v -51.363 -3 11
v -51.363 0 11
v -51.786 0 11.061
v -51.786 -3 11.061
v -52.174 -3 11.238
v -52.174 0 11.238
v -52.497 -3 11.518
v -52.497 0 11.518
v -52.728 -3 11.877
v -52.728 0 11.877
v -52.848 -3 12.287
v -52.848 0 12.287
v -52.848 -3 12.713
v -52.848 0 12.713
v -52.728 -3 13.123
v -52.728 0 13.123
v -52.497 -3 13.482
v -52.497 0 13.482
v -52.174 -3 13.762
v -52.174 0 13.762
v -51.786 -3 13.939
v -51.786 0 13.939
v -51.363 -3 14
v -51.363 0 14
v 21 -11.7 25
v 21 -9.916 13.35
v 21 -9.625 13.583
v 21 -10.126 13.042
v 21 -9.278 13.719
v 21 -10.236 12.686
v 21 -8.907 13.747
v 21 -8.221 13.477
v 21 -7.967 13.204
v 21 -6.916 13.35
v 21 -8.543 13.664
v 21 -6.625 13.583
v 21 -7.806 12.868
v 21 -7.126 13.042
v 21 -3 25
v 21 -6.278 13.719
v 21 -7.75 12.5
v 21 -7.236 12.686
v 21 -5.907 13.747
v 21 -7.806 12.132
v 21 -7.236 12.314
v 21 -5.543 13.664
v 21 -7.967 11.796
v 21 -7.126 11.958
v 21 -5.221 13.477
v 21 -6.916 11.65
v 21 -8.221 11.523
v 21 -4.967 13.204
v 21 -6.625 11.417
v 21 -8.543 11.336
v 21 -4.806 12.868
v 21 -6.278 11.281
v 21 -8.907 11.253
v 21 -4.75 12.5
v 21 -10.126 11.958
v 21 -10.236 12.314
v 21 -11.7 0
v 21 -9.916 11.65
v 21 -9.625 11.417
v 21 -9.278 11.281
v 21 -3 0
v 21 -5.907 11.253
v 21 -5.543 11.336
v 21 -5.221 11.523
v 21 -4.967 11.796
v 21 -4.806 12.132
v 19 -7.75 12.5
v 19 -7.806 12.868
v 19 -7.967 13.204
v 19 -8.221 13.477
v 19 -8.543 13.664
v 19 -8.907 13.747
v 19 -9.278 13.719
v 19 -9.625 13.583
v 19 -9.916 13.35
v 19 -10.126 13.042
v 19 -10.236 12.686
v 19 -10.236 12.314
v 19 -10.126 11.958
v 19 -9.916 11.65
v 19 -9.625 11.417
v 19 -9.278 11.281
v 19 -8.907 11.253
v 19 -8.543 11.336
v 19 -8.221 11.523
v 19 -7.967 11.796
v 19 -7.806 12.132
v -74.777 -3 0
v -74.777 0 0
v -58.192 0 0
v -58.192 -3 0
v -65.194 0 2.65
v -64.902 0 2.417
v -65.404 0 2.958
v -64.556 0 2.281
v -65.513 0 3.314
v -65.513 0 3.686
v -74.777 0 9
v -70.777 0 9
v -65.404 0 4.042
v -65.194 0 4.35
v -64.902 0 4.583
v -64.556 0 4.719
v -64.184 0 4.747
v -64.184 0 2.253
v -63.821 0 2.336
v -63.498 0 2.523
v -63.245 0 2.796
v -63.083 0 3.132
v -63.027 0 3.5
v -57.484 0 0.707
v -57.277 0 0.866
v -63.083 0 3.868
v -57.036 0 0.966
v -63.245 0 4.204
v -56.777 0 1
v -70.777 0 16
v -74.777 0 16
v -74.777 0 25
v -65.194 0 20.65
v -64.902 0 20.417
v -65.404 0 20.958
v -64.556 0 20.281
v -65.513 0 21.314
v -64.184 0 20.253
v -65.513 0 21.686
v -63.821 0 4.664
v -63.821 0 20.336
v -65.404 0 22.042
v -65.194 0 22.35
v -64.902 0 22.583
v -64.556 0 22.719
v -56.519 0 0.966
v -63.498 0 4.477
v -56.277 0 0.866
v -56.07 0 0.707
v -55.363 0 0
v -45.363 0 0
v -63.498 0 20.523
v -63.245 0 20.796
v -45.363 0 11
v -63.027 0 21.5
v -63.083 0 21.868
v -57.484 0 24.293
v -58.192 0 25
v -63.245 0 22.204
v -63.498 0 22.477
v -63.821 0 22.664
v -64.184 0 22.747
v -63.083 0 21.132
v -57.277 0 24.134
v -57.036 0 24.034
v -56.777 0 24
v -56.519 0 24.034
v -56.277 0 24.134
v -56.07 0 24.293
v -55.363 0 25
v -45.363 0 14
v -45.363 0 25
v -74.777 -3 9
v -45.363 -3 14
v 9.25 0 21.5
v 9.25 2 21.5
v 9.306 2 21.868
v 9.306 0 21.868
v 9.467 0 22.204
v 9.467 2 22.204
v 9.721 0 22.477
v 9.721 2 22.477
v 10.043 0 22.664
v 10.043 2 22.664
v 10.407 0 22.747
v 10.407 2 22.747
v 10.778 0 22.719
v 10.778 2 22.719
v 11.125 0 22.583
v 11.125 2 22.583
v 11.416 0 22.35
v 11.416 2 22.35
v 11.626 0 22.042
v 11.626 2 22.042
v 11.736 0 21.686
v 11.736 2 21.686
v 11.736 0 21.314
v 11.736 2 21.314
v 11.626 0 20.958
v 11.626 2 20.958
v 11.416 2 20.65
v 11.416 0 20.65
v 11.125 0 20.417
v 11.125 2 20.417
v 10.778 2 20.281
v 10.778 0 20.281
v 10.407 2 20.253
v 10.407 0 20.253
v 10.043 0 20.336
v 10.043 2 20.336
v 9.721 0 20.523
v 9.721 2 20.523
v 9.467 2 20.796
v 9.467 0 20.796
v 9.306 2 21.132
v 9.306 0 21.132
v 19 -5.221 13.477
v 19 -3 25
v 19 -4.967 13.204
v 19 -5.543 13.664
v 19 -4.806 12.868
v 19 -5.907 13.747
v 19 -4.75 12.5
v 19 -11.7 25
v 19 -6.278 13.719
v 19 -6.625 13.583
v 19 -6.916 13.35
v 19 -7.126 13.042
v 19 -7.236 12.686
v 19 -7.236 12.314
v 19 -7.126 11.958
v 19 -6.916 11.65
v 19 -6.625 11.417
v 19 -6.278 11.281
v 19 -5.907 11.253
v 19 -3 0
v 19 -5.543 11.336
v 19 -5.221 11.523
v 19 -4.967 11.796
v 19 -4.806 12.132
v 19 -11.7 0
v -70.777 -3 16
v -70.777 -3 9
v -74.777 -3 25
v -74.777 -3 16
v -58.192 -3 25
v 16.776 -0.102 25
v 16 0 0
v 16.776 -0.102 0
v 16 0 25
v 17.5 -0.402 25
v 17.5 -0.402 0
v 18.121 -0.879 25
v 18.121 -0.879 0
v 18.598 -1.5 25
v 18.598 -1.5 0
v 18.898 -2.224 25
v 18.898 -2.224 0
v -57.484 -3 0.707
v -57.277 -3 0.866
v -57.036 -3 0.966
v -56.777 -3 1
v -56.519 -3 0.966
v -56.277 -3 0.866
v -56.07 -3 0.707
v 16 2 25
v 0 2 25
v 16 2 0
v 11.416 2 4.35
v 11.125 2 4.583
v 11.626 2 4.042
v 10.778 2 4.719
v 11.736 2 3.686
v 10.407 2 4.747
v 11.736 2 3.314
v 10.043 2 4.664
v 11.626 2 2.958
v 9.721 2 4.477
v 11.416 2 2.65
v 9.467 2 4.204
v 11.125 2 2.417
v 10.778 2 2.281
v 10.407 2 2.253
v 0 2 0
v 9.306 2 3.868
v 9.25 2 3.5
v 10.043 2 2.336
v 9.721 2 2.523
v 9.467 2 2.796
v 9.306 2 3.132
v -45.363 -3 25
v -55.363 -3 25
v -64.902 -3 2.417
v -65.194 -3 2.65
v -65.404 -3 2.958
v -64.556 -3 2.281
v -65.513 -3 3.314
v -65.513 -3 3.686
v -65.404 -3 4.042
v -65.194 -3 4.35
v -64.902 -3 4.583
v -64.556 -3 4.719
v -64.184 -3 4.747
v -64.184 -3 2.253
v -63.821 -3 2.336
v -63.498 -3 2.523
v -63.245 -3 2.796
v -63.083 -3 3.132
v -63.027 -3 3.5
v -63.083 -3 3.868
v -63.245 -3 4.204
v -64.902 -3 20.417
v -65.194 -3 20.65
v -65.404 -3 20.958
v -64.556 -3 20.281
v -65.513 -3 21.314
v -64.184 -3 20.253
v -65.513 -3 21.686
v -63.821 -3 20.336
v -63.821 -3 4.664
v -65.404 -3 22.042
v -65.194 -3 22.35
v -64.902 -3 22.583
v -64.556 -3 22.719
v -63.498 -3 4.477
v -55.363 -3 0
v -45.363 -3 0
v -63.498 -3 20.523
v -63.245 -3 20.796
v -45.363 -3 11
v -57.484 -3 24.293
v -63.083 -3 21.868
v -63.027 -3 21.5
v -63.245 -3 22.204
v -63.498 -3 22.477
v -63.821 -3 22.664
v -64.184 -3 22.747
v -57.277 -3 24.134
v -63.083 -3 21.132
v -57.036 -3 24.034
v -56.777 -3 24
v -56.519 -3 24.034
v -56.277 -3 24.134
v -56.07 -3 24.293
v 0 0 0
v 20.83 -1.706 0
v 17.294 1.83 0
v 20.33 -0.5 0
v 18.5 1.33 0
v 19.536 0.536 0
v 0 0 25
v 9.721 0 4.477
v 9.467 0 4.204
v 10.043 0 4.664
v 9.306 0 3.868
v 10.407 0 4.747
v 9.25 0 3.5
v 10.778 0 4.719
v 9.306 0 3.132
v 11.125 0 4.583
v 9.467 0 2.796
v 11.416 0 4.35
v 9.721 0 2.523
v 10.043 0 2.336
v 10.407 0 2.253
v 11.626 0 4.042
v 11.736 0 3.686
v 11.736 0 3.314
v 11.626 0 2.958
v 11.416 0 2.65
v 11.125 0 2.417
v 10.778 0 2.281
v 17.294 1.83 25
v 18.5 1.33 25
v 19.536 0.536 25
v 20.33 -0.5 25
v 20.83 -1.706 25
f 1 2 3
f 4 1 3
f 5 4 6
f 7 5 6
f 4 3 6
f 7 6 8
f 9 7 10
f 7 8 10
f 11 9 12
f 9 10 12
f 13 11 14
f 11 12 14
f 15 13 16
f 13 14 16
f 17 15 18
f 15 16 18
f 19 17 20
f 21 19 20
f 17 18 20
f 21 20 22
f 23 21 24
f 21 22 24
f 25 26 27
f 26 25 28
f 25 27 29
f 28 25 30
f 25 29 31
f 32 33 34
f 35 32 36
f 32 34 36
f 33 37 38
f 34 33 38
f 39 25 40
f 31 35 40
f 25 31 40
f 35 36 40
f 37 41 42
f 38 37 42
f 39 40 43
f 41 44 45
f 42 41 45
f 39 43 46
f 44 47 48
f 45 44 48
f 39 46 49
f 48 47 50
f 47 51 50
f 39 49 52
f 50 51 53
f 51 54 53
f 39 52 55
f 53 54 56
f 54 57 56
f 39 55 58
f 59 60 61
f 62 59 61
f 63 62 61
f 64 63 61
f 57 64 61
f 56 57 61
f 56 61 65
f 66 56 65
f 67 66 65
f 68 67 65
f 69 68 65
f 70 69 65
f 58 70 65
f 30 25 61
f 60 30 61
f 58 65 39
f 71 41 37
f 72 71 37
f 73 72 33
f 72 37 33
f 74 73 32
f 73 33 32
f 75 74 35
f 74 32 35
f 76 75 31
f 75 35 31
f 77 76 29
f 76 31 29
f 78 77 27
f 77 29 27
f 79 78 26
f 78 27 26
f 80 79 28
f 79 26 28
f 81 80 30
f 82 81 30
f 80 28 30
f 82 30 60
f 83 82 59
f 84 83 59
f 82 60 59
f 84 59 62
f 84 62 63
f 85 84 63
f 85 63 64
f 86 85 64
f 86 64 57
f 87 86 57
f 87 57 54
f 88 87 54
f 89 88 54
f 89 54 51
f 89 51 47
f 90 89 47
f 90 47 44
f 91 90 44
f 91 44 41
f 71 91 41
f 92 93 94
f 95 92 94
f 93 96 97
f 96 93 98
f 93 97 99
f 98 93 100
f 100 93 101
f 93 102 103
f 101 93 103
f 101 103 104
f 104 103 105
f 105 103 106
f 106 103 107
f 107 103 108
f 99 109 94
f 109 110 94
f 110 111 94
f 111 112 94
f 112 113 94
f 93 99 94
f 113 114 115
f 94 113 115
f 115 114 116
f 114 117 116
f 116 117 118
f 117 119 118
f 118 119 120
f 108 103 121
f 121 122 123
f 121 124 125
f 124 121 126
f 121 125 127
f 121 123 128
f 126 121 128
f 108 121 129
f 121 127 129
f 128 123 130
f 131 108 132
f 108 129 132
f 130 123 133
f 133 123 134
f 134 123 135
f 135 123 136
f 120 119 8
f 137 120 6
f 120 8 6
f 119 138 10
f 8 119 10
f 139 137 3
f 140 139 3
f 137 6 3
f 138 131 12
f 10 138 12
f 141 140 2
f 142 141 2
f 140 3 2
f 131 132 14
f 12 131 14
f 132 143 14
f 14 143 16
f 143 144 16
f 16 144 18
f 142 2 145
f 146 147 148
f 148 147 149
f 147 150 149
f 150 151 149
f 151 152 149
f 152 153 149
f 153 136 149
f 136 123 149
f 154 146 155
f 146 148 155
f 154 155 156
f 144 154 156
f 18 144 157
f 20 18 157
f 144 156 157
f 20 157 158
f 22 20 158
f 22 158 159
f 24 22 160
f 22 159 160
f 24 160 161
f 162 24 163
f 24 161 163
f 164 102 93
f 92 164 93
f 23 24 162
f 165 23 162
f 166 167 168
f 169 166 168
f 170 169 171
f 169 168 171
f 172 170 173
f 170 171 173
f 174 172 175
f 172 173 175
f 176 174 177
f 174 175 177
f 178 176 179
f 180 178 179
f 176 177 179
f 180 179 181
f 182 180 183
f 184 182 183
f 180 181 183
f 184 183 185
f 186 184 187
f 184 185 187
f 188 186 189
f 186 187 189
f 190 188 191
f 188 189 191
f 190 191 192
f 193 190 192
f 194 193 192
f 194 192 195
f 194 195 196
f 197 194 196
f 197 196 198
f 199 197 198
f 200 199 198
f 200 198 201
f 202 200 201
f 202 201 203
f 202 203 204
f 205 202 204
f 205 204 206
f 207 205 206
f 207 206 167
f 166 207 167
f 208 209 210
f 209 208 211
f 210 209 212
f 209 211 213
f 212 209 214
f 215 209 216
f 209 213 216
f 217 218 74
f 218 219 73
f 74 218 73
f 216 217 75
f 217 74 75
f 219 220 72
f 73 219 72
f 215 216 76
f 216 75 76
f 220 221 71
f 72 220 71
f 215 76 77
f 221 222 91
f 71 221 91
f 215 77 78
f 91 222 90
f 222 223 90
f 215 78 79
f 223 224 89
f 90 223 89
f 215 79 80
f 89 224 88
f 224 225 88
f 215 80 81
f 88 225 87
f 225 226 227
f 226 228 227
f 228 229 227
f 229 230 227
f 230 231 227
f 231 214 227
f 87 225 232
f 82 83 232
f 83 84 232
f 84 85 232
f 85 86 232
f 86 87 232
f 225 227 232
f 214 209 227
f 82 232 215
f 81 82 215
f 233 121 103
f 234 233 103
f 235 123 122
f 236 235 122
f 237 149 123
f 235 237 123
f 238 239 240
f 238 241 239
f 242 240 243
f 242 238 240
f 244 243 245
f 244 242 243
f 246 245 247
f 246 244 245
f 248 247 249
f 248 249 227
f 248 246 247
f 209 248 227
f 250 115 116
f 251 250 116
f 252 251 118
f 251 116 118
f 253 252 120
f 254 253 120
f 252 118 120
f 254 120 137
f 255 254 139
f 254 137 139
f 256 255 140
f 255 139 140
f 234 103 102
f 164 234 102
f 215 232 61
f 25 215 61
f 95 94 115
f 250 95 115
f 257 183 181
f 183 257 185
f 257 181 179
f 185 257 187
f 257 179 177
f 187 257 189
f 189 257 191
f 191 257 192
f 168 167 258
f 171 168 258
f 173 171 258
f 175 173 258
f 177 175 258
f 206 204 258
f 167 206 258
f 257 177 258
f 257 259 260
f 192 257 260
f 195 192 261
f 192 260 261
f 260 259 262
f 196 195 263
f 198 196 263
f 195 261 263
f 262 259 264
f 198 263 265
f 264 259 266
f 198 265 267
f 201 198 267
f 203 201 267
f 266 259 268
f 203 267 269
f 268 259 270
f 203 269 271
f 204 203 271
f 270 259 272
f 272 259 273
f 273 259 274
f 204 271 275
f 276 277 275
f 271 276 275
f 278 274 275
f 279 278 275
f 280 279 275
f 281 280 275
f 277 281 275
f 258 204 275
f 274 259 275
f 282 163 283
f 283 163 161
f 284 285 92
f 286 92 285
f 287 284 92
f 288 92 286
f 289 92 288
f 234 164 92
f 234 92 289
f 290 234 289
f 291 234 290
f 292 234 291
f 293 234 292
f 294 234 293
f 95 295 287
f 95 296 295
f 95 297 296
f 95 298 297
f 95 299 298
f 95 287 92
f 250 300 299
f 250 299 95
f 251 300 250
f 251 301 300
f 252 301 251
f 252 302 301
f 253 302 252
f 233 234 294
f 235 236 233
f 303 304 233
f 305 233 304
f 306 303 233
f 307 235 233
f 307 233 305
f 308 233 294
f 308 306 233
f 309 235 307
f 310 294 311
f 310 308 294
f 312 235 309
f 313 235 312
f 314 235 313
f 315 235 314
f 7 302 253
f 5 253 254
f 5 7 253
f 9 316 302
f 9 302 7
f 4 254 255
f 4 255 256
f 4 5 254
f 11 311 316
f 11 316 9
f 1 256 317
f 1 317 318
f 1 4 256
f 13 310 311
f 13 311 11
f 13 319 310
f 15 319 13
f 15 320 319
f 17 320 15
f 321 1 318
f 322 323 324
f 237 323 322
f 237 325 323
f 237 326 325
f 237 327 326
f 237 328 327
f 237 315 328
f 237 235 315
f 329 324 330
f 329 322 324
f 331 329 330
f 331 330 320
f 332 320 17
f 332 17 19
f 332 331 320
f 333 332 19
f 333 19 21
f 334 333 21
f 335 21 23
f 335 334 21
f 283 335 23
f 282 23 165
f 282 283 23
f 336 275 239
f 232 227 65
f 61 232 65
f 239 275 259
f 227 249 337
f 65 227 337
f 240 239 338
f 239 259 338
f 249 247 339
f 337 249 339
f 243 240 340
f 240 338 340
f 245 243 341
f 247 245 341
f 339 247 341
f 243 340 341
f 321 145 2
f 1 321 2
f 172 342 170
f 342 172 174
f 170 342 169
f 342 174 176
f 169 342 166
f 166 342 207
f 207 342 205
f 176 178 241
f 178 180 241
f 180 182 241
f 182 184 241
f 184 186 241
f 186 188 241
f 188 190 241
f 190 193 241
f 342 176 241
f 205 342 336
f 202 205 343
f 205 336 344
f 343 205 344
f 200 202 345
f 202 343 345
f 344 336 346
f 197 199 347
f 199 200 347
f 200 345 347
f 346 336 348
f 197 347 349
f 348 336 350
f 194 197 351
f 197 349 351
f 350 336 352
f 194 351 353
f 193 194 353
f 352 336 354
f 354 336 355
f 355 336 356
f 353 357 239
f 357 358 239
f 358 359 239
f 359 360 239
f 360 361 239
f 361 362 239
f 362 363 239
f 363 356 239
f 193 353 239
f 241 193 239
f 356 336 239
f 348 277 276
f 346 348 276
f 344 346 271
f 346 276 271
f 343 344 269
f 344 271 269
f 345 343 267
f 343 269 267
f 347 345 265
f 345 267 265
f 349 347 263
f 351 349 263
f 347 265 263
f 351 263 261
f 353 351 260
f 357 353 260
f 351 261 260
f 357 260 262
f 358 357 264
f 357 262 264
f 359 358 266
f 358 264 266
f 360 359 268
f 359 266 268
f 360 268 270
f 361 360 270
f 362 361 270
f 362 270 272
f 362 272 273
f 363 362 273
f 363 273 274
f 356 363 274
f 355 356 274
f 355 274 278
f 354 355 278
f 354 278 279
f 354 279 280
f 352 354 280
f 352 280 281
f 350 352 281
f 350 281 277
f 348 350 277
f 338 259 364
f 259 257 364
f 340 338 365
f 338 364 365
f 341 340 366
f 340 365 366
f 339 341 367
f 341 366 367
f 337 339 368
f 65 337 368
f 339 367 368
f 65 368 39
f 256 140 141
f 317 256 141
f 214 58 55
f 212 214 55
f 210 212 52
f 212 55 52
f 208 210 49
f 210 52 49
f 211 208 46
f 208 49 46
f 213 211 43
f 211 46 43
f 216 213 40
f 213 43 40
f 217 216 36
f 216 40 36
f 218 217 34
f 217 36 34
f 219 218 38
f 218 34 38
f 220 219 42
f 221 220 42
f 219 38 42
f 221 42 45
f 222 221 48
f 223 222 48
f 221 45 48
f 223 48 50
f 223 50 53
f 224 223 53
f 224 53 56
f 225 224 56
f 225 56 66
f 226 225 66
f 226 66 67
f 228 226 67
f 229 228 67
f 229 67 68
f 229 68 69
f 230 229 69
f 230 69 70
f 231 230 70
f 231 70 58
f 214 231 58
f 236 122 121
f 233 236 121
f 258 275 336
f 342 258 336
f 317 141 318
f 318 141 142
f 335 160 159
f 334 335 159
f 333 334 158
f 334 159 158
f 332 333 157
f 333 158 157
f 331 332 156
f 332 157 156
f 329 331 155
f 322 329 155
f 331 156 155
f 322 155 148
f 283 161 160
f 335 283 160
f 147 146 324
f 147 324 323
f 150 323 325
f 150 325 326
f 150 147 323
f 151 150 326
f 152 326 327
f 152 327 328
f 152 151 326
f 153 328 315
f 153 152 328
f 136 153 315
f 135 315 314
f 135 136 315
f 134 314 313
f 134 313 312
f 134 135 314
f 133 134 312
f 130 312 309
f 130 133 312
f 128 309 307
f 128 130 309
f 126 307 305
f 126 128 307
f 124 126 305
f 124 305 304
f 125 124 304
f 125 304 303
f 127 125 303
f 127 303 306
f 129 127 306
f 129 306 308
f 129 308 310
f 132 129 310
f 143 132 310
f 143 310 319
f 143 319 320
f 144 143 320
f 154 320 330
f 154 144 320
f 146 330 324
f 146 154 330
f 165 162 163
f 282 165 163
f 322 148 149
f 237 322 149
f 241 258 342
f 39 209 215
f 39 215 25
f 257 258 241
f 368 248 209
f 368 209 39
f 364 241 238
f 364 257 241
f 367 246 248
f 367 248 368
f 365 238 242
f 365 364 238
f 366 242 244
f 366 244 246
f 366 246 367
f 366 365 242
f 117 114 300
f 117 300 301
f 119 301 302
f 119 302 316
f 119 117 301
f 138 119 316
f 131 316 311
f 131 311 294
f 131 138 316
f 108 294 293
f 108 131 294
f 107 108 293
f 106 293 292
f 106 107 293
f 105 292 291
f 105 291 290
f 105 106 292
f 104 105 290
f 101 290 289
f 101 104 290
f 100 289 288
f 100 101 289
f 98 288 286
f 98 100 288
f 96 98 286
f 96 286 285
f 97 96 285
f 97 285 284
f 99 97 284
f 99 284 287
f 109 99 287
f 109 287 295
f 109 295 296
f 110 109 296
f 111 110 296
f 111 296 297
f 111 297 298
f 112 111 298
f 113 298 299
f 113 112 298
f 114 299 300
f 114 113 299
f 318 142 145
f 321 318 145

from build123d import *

# Parameters (mm, degrees)
F1_DEPTH = 25
F2_R     = 3
F3_R     = 1.25
F4_DEPTH = 25
F5_R     = 1.25
F6_DEPTH = 25
F7_R     = 5
F8_R     = 1.25
F9_DEPTH = 3


with BuildPart() as f1:
    # F0 (on Top) → F1 (new body)
    with BuildSketch(Plane.XY):
        Polygon((0, 2), (0, 0), (19, 0), (19, -11.7), (21, -11.7), (21, 0), (21, 2), align=None)
    extrude(amount=F1_DEPTH)

    # F2
    f2_edges = [f1.edges().sort_by_distance(p)[0] for p in [
        (19, 0, 12.5),
    ]]
    fillet(f2_edges, radius=F2_R)

    # F3 (on face) → F4 (cut)
    with BuildSketch(Plane.YZ.offset(21)):
        with Locations((-6, 12.5)):
            Circle(F3_R)
        with Locations((-9, 12.5)):
            Circle(F3_R)
    extrude(amount=-F4_DEPTH, mode=Mode.SUBTRACT)

    # F5 (on face) → F6 (cut)
    with BuildSketch(Plane(origin=(0, 2, 0), x_dir=(-1, 0, 0), z_dir=(0, 1, 0))):
        with Locations((-10.5, 21.5)):
            Circle(F5_R)
        with Locations((-10.5, 3.5)):
            Circle(F5_R)
    extrude(amount=-F6_DEPTH, mode=Mode.SUBTRACT)

    # F7
    f7_edges = [f1.edges().sort_by_distance(p)[0] for p in [
        (21, 2, 12.5),
    ]]
    fillet(f7_edges, radius=F7_R)


with BuildPart() as f9:
    # F8 (on Front) → F9 (new body)
    with BuildSketch(Plane.XZ):
        with BuildLine():
            Line((-74.777354, 9), (-74.777354, 0))
            Line((-74.777354, 0), (-58.191568, 0))
            Line((-58.191568, 0), (-57.484461, 0.707107))
            ThreePointArc((-57.484461, 0.707107), (-56.777354, 1), (-56.070248, 0.707107))
            Line((-56.070248, 0.707107), (-55.363141, 0))
            Line((-55.363141, 0), (-45.363141, 0))
            Line((-45.363141, 0), (-45.363141, 11))
            Line((-45.363141, 11), (-51.363141, 11))
            ThreePointArc((-51.363141, 11), (-52.863141, 12.5), (-51.363141, 14))
            Line((-51.363141, 14), (-45.363141, 14))
            Line((-45.363141, 14), (-45.363141, 25))
            Line((-45.363141, 25), (-55.363141, 25))
            Line((-55.363141, 25), (-56.070248, 24.292893))
            ThreePointArc((-56.070248, 24.292893), (-56.777354, 24), (-57.484461, 24.292893))
            Line((-57.484461, 24.292893), (-58.191568, 25))
            Line((-58.191568, 25), (-74.777354, 25))
            Line((-74.777354, 25), (-74.777354, 16))
            Line((-74.777354, 16), (-70.777354, 16))
            Line((-70.777354, 16), (-70.777354, 9))
            Line((-70.777354, 9), (-74.777354, 9))
        make_face()
        with Locations((-64.277354, 3.5)):
            Circle(F8_R, mode=Mode.SUBTRACT)
        with Locations((-64.277354, 21.5)):
            Circle(F8_R, mode=Mode.SUBTRACT)
    extrude(amount=F9_DEPTH)


solid = Compound([f1.part, f9.part])
